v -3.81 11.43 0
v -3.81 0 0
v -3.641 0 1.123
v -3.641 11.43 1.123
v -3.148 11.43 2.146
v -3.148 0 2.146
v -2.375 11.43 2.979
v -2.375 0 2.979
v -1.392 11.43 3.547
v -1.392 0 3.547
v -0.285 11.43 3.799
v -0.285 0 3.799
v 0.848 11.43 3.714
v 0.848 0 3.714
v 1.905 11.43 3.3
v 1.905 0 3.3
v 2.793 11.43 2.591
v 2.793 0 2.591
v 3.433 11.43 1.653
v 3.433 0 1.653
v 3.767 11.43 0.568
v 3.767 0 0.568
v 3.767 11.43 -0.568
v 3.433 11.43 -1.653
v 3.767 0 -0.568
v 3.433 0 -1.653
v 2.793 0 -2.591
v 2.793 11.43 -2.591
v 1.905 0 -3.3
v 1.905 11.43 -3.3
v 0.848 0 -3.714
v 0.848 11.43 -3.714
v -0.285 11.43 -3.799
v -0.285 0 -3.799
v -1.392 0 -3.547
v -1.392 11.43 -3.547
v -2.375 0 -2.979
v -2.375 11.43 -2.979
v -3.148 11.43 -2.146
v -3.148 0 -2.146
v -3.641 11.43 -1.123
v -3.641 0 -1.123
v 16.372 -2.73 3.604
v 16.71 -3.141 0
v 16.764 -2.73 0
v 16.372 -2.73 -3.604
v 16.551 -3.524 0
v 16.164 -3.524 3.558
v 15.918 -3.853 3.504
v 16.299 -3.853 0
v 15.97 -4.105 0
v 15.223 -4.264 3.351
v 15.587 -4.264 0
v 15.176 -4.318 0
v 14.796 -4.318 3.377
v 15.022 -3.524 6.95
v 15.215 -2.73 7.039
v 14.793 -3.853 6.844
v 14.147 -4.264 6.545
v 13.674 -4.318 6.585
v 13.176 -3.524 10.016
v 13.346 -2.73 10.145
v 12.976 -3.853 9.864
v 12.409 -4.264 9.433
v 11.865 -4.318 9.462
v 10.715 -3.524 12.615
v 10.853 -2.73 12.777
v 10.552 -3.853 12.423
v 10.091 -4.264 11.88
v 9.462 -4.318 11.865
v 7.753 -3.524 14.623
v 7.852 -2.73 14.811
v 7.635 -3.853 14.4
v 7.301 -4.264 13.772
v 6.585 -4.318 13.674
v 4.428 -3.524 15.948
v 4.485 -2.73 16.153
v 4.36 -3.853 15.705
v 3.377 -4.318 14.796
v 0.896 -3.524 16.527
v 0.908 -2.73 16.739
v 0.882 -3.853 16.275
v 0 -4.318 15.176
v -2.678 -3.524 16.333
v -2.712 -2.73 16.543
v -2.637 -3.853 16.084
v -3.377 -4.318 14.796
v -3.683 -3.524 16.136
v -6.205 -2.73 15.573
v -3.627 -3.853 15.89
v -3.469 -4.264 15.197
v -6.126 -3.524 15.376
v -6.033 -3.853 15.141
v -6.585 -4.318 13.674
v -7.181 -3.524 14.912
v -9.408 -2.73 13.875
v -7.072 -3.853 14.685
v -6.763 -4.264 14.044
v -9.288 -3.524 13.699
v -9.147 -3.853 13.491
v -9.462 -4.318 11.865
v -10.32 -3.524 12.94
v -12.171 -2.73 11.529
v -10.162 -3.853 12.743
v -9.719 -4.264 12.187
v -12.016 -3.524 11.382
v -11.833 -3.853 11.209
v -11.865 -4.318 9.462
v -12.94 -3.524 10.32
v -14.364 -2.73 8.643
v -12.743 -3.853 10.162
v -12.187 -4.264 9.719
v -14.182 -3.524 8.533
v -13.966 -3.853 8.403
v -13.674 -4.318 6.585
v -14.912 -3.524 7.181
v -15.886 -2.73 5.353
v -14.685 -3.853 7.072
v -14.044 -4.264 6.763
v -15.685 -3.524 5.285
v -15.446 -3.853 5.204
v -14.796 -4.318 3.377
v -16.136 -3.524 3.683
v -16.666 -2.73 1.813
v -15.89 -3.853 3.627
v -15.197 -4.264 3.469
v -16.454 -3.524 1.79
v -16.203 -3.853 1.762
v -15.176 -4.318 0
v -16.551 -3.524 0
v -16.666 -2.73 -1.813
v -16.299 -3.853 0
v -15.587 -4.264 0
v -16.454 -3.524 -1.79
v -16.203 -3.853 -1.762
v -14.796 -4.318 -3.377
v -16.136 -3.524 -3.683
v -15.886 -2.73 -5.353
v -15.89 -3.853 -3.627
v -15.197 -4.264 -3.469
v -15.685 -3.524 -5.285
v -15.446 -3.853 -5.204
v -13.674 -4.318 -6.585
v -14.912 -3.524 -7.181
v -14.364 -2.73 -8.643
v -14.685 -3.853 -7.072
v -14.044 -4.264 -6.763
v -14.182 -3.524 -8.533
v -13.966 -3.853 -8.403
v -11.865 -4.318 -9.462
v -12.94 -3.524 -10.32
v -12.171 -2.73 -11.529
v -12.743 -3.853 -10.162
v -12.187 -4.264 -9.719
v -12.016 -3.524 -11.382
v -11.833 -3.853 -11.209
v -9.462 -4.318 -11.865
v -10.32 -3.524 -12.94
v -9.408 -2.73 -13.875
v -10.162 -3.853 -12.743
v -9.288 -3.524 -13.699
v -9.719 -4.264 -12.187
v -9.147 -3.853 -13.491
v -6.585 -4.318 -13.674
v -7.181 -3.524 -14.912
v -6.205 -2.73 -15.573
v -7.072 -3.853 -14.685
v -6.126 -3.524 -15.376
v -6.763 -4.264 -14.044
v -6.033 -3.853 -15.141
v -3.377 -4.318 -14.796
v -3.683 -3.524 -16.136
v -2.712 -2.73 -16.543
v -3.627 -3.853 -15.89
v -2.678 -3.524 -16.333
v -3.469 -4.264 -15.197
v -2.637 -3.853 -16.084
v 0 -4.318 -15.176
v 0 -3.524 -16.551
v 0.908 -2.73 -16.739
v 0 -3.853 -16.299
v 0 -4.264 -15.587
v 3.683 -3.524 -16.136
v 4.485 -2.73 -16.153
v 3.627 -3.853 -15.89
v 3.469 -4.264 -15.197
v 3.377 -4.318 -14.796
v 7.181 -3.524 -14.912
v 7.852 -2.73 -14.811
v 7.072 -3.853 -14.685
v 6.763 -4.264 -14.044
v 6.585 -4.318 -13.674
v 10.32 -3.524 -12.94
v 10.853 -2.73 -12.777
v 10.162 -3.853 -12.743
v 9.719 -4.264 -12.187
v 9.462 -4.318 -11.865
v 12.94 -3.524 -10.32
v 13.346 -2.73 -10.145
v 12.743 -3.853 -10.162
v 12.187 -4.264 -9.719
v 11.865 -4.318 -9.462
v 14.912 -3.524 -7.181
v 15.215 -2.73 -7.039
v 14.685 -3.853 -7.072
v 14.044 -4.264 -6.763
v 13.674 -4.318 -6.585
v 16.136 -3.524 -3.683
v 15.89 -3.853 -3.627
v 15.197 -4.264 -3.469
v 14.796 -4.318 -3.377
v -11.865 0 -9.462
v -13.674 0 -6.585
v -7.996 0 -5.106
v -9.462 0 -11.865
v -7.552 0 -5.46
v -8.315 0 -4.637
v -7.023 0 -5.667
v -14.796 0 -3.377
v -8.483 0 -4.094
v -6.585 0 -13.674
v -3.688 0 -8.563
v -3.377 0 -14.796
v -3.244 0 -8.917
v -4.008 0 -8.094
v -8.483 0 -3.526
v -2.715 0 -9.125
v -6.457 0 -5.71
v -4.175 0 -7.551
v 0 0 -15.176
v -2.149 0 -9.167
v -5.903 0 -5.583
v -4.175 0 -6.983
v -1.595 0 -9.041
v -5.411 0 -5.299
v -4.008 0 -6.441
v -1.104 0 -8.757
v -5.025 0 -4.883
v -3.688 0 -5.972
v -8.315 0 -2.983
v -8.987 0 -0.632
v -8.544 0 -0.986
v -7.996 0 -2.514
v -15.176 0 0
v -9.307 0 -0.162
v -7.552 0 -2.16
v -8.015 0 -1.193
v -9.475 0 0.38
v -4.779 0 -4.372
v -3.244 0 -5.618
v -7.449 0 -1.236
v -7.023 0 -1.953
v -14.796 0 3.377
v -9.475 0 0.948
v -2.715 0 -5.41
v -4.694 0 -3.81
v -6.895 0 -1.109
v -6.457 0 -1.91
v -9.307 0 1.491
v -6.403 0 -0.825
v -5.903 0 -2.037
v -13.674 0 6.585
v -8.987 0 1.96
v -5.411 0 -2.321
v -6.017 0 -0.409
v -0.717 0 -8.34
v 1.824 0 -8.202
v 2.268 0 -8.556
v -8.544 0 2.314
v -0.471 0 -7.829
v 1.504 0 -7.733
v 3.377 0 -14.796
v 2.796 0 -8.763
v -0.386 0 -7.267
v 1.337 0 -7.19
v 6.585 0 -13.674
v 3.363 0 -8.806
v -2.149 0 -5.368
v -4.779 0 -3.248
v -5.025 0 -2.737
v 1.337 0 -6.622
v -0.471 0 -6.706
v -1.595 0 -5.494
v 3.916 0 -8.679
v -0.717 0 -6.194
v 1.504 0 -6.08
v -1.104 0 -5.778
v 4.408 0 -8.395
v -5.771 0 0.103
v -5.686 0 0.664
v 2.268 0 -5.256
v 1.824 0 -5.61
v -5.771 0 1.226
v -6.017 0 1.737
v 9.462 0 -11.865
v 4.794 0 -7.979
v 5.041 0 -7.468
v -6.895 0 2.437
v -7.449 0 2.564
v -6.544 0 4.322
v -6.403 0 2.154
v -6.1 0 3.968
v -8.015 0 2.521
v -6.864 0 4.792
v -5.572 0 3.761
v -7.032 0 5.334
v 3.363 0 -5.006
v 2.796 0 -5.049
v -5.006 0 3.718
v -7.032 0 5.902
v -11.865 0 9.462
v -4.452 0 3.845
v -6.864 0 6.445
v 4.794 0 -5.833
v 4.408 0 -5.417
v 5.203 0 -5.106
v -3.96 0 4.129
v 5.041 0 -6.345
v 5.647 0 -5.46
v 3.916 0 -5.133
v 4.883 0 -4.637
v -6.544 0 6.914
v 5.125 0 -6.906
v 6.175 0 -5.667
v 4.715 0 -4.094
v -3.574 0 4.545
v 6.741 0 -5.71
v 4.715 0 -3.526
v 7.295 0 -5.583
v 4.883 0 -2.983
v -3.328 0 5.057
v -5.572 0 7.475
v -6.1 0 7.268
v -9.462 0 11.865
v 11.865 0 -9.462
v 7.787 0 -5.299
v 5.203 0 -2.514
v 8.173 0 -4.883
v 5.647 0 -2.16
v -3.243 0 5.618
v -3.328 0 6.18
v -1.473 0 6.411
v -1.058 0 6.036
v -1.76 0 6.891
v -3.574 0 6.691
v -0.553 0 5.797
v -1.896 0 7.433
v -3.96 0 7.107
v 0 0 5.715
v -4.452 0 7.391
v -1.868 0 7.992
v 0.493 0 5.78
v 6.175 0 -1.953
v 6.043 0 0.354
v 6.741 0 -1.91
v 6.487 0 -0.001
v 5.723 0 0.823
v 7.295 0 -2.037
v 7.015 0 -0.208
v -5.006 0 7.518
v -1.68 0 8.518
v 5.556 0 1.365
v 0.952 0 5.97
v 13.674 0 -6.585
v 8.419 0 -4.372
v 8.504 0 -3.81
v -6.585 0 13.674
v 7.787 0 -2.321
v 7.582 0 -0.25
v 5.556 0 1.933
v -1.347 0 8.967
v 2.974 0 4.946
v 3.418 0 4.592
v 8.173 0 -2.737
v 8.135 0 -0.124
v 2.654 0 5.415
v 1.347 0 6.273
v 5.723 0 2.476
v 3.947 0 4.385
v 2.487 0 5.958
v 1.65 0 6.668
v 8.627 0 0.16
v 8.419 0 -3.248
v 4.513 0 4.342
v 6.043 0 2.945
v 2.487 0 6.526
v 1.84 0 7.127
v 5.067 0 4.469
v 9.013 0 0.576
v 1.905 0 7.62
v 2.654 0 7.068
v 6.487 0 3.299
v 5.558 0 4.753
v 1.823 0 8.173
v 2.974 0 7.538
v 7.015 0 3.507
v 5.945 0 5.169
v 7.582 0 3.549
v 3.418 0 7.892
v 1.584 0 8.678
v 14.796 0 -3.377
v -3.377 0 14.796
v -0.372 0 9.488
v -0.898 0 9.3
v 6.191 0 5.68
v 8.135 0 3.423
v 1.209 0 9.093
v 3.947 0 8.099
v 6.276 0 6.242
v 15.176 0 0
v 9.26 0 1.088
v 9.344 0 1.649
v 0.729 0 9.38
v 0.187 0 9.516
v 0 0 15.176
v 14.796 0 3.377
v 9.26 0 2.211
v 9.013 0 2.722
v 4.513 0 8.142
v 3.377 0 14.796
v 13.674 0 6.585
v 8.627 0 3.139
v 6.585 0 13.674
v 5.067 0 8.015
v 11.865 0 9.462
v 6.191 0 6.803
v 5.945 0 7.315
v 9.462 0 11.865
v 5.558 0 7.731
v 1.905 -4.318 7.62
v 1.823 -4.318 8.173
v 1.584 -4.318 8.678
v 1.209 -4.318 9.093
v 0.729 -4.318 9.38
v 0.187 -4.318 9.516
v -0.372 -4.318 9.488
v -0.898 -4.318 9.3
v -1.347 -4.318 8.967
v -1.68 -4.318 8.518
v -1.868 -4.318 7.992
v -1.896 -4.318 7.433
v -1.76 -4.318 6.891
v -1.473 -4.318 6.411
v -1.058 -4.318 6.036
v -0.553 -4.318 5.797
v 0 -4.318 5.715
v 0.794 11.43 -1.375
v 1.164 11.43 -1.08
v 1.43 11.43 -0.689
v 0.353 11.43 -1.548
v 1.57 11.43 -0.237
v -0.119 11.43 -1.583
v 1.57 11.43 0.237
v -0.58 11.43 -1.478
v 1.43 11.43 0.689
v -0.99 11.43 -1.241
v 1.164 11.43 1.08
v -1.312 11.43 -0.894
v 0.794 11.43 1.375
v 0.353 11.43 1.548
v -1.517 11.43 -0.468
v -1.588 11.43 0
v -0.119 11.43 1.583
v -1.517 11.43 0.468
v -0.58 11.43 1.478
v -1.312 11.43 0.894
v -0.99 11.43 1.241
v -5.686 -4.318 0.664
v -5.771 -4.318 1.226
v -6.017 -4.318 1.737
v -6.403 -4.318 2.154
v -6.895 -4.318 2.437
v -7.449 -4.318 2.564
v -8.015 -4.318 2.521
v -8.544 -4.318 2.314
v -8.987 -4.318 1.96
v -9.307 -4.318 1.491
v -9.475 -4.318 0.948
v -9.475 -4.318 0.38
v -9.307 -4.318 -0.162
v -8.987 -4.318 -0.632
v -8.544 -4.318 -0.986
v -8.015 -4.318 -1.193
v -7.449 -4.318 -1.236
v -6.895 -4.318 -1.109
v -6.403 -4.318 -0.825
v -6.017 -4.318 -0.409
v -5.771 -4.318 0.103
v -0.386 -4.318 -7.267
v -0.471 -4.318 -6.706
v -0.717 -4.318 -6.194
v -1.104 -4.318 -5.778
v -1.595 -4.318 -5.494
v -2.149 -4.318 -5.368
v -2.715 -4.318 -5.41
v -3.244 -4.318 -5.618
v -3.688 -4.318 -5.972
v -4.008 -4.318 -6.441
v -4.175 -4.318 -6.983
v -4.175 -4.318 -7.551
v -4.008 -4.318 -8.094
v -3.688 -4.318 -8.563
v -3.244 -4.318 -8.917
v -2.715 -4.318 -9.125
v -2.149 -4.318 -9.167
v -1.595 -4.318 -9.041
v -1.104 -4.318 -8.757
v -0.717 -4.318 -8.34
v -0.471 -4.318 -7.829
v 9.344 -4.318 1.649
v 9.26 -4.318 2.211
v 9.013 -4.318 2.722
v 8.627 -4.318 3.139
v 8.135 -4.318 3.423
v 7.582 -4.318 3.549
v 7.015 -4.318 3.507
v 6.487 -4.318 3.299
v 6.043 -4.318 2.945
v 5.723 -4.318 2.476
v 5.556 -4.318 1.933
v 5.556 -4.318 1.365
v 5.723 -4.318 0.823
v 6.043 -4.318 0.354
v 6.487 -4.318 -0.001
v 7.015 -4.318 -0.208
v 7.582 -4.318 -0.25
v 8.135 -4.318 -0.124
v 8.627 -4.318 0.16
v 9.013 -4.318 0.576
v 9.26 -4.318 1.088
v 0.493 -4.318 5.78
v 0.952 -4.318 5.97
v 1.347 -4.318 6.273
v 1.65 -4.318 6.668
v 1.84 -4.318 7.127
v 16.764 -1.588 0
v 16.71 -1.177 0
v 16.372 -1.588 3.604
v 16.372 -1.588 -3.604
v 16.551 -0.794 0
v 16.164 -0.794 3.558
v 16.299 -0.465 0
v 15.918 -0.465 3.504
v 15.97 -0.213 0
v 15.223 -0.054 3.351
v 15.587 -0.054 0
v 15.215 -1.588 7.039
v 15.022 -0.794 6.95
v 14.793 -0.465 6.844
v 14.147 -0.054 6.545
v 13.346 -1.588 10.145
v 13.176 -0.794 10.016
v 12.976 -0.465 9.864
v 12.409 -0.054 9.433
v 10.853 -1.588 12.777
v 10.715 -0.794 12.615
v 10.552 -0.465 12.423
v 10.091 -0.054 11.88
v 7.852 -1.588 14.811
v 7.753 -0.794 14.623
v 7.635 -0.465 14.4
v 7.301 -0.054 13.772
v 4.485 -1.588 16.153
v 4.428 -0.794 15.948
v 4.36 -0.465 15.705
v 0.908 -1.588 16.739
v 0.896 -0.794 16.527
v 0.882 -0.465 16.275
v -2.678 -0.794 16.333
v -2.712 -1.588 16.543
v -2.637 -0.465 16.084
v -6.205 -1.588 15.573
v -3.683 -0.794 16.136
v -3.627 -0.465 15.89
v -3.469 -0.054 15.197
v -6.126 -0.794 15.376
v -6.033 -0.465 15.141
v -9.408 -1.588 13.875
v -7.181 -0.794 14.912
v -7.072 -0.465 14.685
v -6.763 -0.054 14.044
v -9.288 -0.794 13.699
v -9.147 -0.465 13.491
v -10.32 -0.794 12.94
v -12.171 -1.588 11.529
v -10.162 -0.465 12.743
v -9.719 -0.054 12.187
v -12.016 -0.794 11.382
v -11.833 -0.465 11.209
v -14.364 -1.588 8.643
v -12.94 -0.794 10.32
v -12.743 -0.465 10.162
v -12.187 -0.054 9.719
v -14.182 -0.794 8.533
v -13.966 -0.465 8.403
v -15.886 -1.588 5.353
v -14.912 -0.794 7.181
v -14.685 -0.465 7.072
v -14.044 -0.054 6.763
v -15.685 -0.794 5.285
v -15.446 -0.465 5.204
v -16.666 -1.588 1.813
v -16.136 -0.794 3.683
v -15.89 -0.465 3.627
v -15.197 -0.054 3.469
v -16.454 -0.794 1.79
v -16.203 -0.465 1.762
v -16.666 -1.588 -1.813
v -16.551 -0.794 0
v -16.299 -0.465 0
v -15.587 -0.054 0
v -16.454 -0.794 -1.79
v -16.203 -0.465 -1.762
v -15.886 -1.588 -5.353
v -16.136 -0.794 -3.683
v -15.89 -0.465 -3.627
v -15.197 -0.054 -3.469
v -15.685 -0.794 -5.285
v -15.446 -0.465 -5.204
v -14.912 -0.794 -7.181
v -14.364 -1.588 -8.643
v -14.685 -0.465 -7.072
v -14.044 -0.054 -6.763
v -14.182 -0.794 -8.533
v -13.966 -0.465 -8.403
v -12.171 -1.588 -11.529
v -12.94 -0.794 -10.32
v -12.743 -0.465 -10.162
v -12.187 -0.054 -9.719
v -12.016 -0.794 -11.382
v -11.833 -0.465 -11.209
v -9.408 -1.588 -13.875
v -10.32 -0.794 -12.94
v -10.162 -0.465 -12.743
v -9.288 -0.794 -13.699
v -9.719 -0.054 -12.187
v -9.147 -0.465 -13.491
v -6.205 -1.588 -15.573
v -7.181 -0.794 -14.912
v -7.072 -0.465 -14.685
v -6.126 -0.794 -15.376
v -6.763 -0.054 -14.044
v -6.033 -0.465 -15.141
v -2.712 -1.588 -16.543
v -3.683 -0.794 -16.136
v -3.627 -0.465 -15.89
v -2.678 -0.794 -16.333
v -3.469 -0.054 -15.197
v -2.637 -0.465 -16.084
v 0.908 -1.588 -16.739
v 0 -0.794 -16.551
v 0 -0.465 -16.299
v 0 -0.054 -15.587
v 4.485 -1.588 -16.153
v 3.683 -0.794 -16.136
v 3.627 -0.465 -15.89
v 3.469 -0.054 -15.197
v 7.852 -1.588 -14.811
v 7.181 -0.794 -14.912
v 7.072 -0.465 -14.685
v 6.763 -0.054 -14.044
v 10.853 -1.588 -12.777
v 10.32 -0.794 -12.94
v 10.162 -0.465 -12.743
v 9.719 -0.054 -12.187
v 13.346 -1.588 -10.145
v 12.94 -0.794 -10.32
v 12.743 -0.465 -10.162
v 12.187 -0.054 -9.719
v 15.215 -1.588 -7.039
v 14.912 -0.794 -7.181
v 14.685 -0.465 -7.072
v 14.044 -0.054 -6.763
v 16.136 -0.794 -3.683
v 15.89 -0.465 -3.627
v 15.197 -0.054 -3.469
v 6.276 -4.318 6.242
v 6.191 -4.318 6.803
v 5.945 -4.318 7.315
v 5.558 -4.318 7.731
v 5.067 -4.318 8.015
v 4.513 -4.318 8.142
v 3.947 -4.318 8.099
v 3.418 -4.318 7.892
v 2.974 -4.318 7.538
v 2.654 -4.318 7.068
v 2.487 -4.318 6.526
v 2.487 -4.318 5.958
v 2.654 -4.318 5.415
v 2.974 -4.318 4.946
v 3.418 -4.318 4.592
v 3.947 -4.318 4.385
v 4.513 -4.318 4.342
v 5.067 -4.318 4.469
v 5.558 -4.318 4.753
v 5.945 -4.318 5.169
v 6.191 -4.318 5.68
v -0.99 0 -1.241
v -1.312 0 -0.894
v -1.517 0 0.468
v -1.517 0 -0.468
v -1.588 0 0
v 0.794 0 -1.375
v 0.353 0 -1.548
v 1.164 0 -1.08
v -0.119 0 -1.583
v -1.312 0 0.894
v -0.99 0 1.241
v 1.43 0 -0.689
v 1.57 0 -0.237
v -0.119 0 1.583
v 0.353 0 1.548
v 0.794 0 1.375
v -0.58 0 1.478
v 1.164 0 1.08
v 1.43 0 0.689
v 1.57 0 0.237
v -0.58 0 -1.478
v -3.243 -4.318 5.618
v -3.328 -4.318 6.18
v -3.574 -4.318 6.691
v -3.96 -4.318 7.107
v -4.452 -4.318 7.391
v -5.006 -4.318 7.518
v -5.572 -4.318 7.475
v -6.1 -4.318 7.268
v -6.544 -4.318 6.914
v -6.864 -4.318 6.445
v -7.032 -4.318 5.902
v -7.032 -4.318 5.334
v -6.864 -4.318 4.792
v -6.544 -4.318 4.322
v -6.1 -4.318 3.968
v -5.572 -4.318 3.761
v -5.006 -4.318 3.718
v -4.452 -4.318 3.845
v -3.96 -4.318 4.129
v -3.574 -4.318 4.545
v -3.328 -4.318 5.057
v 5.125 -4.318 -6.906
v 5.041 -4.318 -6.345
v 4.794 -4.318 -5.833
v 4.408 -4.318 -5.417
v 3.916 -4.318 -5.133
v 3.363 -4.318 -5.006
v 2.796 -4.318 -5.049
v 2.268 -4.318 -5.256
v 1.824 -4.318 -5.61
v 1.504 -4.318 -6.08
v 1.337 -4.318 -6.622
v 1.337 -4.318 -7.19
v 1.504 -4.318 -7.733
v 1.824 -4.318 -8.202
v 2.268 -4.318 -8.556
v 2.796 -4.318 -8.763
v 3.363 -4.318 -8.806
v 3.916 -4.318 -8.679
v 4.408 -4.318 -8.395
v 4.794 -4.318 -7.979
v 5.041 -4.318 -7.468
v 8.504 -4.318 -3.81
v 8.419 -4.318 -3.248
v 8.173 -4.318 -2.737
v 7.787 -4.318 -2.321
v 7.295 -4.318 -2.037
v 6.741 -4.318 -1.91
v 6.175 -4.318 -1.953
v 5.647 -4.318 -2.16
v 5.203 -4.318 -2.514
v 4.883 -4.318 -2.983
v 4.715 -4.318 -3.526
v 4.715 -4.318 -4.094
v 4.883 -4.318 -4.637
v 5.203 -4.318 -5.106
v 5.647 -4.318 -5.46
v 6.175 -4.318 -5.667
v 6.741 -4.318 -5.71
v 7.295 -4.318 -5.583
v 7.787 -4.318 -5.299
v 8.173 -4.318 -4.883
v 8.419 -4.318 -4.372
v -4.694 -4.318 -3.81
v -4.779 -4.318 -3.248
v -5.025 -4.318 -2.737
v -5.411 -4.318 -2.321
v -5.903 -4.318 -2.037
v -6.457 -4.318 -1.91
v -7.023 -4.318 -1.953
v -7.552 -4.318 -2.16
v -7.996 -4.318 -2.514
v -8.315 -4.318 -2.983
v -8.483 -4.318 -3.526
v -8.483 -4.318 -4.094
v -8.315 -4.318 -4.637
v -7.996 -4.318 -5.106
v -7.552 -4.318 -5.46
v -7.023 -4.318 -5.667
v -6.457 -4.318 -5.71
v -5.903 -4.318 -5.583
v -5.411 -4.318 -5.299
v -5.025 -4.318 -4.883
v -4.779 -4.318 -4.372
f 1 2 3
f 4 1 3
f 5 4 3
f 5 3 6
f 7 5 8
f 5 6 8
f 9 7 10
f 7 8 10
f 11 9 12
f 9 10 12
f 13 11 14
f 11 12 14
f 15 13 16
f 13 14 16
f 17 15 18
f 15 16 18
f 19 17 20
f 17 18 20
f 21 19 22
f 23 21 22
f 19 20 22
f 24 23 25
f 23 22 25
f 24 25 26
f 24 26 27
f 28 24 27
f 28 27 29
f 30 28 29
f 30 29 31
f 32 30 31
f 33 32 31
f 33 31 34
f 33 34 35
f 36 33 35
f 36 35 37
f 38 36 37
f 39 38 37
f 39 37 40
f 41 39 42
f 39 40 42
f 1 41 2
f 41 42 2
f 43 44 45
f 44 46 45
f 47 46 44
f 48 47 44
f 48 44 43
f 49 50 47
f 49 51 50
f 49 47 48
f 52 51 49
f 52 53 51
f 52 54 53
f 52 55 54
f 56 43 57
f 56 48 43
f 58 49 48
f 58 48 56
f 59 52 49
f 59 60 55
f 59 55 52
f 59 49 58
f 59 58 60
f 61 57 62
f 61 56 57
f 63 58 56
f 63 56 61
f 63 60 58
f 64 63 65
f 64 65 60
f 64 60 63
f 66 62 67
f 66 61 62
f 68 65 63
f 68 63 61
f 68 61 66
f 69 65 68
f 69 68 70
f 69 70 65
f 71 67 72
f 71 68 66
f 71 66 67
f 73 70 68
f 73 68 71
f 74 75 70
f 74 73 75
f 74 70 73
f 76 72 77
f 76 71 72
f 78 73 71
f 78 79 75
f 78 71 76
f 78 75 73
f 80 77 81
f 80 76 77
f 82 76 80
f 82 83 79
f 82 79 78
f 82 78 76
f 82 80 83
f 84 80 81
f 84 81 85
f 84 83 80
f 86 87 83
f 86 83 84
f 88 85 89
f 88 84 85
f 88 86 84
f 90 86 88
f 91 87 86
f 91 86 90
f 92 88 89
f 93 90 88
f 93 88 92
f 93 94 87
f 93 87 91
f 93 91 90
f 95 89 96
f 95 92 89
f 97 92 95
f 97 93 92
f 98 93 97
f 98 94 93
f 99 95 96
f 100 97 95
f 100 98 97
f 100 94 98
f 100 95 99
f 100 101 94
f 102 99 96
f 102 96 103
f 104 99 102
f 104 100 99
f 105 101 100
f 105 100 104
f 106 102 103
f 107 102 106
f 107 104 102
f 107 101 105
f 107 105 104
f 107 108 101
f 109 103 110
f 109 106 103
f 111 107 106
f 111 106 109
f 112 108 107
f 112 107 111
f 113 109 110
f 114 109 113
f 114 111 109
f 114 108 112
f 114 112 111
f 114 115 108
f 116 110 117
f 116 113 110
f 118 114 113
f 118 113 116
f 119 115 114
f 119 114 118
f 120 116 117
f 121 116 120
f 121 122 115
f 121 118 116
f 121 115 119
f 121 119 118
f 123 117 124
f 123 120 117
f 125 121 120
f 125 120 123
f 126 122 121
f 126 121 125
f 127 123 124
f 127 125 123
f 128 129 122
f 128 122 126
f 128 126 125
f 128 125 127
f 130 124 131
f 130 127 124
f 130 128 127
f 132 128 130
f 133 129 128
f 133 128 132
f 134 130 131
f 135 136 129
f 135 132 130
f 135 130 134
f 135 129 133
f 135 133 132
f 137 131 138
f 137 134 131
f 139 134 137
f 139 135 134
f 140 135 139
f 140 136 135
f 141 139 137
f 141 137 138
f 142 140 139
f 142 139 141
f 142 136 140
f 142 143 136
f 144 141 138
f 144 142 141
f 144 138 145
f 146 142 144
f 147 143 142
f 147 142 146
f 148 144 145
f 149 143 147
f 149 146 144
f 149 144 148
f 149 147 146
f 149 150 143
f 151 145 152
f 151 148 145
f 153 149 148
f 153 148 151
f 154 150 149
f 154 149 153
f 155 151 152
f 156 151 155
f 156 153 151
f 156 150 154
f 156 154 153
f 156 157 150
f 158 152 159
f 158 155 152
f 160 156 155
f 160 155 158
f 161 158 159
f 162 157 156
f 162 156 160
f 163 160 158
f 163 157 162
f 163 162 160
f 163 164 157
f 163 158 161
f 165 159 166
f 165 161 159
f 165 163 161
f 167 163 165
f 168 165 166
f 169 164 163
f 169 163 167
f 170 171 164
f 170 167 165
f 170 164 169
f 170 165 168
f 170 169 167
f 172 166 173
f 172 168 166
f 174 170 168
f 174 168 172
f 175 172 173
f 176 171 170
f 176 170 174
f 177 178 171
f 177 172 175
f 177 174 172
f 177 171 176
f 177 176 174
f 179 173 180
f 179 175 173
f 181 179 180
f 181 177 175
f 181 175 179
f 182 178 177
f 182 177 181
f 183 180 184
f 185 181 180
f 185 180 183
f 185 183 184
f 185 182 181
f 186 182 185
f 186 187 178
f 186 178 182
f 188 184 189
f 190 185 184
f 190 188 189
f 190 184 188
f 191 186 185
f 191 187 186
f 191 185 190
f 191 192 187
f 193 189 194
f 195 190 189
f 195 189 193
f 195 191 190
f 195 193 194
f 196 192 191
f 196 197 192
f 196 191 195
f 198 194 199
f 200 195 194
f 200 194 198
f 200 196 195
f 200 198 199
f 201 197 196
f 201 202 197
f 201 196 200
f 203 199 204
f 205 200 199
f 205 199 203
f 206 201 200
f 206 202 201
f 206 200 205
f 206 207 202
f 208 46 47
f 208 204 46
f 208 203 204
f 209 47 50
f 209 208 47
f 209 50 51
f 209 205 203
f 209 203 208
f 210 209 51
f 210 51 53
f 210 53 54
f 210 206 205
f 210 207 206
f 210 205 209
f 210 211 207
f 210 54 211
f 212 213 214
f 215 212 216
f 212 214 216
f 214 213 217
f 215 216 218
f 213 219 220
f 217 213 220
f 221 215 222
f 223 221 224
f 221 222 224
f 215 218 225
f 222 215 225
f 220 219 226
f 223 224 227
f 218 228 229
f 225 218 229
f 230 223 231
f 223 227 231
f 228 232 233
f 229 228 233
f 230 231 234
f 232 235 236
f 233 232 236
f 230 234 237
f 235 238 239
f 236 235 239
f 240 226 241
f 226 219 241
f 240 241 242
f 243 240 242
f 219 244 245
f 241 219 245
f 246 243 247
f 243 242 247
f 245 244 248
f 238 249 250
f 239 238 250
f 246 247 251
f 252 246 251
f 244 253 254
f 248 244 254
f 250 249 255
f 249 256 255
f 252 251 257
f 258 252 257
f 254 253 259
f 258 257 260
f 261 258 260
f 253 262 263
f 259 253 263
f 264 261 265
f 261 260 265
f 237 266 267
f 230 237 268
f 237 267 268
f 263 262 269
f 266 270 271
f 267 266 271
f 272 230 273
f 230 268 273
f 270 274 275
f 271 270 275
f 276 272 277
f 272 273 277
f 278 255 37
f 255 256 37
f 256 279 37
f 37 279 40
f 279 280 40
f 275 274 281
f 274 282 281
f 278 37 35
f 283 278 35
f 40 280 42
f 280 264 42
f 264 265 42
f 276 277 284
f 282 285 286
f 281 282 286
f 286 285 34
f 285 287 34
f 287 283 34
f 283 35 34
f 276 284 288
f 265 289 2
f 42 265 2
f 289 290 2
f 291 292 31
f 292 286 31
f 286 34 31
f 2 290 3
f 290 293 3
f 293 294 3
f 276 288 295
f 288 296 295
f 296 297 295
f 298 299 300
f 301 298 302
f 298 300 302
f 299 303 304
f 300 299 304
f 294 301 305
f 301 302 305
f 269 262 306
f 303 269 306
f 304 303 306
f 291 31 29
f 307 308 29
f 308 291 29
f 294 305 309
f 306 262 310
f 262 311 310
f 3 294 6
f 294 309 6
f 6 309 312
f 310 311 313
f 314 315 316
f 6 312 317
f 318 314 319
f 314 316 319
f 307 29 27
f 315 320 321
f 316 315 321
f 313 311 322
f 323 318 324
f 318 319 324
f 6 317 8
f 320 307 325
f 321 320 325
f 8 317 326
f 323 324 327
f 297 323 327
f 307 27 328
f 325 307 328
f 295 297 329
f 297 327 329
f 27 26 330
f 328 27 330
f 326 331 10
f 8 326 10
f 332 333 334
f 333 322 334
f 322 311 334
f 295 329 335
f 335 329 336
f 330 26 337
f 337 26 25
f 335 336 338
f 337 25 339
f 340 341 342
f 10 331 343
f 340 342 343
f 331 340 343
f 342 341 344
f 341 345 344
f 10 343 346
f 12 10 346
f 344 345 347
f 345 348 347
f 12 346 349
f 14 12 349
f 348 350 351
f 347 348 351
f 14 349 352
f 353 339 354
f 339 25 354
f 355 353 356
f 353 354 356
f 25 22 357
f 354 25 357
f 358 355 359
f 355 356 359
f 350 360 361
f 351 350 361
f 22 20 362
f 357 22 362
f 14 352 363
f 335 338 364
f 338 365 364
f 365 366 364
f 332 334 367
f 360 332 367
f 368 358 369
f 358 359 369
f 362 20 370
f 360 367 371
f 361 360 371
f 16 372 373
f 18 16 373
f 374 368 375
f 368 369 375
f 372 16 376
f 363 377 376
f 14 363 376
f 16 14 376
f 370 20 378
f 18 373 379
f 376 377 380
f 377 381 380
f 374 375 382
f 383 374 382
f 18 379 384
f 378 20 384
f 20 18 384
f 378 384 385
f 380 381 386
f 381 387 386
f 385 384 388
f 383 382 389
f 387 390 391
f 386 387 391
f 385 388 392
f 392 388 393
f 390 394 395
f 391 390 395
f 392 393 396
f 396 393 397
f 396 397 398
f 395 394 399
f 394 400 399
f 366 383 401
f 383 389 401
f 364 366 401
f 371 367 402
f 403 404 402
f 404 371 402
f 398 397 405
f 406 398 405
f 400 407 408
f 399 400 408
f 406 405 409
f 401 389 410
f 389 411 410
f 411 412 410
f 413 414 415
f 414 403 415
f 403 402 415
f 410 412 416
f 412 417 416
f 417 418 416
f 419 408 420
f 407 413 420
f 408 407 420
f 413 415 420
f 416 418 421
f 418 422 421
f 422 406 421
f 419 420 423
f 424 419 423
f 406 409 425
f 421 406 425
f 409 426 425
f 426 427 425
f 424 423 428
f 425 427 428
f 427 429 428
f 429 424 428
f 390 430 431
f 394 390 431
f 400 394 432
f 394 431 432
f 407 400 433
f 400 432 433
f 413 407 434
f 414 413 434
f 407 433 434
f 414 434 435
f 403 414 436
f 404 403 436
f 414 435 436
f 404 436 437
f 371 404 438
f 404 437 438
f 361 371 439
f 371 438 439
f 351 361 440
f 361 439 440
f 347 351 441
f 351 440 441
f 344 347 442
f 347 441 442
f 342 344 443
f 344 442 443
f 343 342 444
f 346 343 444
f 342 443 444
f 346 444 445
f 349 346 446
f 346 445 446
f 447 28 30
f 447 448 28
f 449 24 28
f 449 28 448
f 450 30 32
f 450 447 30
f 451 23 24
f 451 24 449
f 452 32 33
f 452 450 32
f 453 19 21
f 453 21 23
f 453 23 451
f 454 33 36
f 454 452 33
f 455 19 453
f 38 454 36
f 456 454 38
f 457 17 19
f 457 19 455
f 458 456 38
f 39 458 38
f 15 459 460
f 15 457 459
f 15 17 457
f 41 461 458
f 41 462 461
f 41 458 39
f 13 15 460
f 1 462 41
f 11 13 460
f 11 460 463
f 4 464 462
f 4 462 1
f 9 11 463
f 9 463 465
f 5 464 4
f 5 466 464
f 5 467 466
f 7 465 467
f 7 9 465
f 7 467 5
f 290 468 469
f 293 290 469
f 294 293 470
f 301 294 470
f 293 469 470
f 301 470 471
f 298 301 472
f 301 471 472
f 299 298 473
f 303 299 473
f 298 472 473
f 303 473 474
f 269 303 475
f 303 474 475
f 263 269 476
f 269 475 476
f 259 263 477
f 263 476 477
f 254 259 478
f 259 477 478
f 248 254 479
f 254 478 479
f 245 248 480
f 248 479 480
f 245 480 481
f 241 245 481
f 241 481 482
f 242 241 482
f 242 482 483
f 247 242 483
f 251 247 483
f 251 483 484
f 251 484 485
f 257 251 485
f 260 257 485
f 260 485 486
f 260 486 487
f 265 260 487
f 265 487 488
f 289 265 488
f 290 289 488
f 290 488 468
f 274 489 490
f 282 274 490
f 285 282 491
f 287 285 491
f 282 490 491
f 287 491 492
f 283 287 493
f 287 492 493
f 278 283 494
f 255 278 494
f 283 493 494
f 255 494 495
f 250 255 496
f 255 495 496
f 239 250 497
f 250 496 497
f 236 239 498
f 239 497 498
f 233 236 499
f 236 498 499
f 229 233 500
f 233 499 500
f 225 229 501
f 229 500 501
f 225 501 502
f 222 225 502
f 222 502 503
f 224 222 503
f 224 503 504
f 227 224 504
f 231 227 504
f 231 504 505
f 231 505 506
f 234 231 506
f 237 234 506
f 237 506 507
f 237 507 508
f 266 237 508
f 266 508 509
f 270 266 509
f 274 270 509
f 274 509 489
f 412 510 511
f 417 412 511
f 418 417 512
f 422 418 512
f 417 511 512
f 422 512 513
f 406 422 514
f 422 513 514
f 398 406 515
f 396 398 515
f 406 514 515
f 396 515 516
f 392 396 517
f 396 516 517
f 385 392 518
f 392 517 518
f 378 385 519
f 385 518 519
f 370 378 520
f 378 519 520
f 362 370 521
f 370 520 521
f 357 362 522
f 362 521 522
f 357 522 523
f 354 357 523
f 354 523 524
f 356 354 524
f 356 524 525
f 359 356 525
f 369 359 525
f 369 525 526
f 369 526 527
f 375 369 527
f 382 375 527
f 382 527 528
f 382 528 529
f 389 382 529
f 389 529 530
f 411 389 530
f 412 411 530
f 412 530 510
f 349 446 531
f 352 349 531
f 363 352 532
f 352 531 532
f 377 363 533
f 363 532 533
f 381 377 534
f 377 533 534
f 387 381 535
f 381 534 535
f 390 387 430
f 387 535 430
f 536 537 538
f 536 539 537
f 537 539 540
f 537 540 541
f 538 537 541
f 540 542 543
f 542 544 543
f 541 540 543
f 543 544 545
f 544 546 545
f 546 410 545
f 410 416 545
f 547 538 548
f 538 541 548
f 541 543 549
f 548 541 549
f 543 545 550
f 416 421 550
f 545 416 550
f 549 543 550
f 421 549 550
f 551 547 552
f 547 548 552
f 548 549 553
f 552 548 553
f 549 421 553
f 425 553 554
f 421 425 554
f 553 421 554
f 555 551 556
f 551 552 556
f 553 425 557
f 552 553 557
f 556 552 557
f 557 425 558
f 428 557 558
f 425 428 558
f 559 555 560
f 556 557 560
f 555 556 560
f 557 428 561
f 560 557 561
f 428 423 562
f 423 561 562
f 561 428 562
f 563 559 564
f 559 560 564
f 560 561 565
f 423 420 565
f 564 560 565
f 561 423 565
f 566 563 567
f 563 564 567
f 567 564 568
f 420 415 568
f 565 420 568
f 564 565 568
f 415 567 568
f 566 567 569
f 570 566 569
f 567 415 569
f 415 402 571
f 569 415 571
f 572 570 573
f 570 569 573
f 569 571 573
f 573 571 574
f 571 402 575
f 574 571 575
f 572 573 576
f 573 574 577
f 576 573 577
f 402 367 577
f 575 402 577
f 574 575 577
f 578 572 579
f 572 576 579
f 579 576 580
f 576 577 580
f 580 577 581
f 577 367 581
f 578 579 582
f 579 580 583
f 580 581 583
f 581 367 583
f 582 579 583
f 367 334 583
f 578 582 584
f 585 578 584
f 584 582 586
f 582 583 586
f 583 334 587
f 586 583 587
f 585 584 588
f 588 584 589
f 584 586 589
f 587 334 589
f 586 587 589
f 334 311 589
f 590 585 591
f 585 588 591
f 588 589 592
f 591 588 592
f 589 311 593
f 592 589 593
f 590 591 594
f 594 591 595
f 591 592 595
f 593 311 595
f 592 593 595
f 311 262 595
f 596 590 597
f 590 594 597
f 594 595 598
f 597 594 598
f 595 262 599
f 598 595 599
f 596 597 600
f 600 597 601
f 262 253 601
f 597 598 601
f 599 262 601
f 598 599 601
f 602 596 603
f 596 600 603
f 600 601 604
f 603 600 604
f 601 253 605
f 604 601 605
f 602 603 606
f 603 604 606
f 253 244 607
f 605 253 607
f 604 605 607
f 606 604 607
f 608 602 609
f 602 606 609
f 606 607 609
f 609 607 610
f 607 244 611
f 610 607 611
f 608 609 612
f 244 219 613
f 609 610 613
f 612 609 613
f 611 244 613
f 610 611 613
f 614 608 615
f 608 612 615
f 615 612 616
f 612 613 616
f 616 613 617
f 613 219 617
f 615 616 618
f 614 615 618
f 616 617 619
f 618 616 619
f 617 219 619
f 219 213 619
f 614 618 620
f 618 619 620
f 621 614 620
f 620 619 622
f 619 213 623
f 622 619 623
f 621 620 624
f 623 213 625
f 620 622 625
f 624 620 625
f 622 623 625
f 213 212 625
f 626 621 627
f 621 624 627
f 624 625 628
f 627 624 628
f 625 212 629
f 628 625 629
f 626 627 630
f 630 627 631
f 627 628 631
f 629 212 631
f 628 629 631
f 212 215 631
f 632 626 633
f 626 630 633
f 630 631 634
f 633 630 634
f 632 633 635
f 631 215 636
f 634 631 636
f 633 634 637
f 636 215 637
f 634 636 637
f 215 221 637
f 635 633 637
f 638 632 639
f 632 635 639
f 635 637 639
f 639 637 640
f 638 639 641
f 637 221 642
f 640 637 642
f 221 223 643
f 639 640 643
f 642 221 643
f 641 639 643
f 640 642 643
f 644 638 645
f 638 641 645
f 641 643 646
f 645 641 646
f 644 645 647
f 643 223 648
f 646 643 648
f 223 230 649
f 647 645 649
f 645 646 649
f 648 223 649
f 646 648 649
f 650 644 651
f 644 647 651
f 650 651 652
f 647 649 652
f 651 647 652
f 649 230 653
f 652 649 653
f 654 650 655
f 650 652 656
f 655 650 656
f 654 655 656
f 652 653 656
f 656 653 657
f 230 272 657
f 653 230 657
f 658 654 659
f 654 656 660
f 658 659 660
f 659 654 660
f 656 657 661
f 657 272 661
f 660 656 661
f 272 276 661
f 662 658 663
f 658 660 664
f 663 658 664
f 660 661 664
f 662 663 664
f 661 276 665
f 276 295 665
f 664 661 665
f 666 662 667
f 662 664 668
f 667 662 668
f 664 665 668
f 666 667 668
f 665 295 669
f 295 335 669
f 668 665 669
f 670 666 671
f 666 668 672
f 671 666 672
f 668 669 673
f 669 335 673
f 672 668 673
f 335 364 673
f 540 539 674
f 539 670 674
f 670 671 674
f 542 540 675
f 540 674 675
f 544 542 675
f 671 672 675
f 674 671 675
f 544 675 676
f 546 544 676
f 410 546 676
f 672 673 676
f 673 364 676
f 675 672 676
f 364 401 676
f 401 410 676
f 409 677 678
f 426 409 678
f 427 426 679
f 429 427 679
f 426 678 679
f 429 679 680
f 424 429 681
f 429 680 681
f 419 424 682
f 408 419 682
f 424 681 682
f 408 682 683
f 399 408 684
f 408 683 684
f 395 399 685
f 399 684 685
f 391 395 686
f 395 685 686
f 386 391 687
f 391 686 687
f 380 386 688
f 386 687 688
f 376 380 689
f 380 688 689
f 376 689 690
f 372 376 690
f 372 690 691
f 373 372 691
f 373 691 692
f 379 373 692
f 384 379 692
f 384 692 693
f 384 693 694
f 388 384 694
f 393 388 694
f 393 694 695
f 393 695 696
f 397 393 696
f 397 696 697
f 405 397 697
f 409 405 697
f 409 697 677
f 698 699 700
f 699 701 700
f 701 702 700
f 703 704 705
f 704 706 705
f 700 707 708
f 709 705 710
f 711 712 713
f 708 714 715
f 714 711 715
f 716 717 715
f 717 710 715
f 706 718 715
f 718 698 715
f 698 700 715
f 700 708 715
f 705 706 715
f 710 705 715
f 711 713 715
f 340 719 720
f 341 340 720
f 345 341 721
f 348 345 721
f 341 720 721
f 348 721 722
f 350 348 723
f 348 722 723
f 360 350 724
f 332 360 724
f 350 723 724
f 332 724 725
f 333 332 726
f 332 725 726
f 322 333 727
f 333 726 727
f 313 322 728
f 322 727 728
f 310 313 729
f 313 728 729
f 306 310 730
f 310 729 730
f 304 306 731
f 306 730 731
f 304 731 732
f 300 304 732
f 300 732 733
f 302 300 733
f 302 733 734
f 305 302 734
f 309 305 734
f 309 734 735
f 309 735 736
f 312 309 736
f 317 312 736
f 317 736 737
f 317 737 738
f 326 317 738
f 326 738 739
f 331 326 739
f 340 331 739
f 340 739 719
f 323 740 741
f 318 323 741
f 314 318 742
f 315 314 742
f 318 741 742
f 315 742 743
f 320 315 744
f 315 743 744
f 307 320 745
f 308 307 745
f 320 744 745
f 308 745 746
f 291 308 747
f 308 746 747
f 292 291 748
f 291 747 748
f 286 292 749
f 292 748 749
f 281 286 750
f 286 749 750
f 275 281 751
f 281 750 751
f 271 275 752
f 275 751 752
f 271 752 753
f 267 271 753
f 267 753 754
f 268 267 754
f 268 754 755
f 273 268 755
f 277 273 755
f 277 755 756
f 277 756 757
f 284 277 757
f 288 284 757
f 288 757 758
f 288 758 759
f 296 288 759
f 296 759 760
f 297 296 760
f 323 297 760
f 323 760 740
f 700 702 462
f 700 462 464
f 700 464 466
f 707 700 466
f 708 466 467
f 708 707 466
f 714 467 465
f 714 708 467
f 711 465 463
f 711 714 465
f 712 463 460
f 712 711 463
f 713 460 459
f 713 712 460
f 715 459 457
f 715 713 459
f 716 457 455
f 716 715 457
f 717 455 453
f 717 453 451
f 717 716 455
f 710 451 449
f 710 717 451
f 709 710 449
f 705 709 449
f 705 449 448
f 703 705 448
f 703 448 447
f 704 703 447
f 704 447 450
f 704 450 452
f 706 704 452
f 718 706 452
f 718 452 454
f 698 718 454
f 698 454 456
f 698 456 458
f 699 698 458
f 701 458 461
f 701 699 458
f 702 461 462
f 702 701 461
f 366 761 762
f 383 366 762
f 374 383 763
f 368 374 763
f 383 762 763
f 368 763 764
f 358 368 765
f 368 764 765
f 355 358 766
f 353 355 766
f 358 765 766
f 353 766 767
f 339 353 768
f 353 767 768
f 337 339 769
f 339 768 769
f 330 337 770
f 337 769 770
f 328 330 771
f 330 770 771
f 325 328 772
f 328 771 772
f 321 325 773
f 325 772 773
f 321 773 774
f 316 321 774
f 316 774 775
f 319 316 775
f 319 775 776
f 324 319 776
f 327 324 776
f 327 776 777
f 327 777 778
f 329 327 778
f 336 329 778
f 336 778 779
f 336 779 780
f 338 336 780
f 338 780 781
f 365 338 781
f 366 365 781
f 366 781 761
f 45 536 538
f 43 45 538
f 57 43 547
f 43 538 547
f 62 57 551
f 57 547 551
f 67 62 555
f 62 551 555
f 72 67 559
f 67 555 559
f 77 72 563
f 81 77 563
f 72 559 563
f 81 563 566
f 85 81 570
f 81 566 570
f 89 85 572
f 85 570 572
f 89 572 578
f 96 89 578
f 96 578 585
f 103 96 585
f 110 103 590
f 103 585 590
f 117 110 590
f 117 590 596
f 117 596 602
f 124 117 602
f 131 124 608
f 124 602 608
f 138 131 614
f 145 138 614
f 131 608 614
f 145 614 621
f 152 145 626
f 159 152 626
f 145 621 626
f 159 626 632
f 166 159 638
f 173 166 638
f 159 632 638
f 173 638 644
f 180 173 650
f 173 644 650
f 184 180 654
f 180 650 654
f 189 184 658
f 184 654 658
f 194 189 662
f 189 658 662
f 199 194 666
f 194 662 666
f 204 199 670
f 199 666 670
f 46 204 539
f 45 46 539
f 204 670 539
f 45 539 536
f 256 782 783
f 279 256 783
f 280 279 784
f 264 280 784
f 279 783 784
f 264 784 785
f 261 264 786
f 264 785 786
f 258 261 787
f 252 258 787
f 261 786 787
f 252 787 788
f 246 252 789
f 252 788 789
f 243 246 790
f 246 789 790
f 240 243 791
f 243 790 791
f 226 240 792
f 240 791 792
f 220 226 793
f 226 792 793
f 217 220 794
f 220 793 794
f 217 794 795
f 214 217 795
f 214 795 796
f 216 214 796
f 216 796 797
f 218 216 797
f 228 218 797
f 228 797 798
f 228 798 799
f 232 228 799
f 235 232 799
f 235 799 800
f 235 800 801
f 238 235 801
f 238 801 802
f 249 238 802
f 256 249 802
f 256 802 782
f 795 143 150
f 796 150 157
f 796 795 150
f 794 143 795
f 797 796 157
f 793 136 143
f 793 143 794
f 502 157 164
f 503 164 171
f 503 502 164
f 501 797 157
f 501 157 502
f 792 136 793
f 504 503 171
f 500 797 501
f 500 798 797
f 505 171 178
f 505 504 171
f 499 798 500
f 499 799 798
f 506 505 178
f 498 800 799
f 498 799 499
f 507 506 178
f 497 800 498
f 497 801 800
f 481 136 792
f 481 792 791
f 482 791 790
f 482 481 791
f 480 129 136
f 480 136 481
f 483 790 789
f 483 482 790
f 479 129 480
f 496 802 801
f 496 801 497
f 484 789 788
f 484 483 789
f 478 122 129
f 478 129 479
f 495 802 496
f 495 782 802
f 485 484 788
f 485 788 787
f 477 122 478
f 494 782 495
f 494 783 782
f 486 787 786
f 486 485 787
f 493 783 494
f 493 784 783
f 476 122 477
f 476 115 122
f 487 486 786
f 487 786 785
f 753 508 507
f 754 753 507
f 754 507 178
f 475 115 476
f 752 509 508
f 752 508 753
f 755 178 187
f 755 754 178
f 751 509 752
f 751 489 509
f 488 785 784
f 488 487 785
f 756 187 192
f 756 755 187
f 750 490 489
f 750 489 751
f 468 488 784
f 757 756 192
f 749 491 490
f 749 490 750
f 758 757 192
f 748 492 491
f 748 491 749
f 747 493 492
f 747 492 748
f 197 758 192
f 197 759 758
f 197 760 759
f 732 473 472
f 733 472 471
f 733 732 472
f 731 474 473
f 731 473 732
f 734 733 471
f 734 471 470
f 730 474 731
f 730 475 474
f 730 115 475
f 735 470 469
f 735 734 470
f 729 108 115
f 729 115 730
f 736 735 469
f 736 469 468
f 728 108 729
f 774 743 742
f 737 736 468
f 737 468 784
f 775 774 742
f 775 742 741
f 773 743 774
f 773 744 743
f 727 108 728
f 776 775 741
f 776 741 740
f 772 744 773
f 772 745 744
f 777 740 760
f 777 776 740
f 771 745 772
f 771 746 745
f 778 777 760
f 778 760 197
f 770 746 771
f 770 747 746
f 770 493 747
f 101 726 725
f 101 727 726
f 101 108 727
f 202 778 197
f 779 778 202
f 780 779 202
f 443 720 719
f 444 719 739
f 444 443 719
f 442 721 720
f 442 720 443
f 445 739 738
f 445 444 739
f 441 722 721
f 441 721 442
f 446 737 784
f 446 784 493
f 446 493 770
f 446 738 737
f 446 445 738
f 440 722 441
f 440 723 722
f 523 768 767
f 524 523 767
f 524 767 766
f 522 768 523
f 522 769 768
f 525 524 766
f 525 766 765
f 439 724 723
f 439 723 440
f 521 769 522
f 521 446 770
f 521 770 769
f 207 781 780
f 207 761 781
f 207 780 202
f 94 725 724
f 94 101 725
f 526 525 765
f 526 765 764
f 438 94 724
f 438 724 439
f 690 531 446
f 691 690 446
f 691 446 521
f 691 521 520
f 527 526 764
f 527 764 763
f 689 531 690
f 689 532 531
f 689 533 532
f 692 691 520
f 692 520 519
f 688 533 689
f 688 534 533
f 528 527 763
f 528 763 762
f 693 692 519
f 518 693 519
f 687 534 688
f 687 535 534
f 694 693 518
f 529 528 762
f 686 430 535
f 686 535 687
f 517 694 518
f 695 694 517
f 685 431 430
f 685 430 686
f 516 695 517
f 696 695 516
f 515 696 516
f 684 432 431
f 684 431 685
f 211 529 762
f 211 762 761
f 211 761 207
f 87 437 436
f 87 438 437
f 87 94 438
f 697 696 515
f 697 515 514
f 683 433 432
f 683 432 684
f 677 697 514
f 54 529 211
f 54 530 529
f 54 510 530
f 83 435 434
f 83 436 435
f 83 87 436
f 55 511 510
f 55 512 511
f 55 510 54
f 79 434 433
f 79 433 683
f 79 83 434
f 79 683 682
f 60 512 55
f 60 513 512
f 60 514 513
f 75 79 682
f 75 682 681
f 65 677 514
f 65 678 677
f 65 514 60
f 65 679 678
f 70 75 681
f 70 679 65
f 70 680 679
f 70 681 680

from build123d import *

# Parameters (mm, degrees)
F0_R     = 16.764
F1_DEPTH = 4.318
F2_R     = 1.5875
F3_R     = 1.905
F4_DEPTH = 25.4
F5_R     = 1.5875
F6_DEPTH = 19.05
F5_R_2   = 3.81
F7_DEPTH = 11.43


with BuildPart() as f1:
    # F0 (on Front) → F1 (new body)
    with BuildSketch(Plane.XZ):
        Circle(F0_R)
    extrude(amount=F1_DEPTH)

    # F2
    f2_edges = [f1.edges().sort_by_distance(p)[0] for p in [
        (-16.764, 0, 0),
        (-16.764, -4.318, 0),
    ]]
    fillet(f2_edges, radius=F2_R)

    # F3 (on face) → F4 (cut)
    with BuildSketch(Plane.XZ.offset(4.318)):
        with BuildLine():
            ThreePointArc((0, 5.715), (1.347038, 6.272962), (1.905, 7.62))
            ThreePointArc((1.905, 7.62), (-1.347038, 8.967038), (0, 5.715))
        make_face()
        with Locations((4.370652, 6.241939)):
            Circle(F3_R)
        with Locations((7.439376, 1.64927)):
            Circle(F3_R)
        with Locations((6.599114, -3.81)):
            Circle(F3_R)
        with Locations((3.220351, -6.906065)):
            Circle(F3_R)
        with Locations((-2.291378, -7.267323)):
            Circle(F3_R)
        with Locations((-6.599114, -3.81)):
            Circle(F3_R)
        with Locations((-7.591004, 0.664127)):
            Circle(F3_R)
        with Locations((-5.147997, 5.618053)):
            Circle(F3_R)
    extrude(amount=-F4_DEPTH, mode=Mode.SUBTRACT)

    # F5 (on face) → F6 (cut)
    with BuildSketch(Plane(origin=(0, 0, 0), x_dir=(-1, 0, 0), z_dir=(0, 1, 0))):
        Circle(F5_R)
    extrude(amount=F6_DEPTH, mode=Mode.SUBTRACT)

    # F5 (on face) → F7 (join)
    with BuildSketch(Plane(origin=(0, 0, 0), x_dir=(-1, 0, 0), z_dir=(0, 1, 0))):
        Circle(F5_R_2)
        Circle(F5_R, mode=Mode.SUBTRACT)
    extrude(amount=F7_DEPTH)


solid = f1.part
